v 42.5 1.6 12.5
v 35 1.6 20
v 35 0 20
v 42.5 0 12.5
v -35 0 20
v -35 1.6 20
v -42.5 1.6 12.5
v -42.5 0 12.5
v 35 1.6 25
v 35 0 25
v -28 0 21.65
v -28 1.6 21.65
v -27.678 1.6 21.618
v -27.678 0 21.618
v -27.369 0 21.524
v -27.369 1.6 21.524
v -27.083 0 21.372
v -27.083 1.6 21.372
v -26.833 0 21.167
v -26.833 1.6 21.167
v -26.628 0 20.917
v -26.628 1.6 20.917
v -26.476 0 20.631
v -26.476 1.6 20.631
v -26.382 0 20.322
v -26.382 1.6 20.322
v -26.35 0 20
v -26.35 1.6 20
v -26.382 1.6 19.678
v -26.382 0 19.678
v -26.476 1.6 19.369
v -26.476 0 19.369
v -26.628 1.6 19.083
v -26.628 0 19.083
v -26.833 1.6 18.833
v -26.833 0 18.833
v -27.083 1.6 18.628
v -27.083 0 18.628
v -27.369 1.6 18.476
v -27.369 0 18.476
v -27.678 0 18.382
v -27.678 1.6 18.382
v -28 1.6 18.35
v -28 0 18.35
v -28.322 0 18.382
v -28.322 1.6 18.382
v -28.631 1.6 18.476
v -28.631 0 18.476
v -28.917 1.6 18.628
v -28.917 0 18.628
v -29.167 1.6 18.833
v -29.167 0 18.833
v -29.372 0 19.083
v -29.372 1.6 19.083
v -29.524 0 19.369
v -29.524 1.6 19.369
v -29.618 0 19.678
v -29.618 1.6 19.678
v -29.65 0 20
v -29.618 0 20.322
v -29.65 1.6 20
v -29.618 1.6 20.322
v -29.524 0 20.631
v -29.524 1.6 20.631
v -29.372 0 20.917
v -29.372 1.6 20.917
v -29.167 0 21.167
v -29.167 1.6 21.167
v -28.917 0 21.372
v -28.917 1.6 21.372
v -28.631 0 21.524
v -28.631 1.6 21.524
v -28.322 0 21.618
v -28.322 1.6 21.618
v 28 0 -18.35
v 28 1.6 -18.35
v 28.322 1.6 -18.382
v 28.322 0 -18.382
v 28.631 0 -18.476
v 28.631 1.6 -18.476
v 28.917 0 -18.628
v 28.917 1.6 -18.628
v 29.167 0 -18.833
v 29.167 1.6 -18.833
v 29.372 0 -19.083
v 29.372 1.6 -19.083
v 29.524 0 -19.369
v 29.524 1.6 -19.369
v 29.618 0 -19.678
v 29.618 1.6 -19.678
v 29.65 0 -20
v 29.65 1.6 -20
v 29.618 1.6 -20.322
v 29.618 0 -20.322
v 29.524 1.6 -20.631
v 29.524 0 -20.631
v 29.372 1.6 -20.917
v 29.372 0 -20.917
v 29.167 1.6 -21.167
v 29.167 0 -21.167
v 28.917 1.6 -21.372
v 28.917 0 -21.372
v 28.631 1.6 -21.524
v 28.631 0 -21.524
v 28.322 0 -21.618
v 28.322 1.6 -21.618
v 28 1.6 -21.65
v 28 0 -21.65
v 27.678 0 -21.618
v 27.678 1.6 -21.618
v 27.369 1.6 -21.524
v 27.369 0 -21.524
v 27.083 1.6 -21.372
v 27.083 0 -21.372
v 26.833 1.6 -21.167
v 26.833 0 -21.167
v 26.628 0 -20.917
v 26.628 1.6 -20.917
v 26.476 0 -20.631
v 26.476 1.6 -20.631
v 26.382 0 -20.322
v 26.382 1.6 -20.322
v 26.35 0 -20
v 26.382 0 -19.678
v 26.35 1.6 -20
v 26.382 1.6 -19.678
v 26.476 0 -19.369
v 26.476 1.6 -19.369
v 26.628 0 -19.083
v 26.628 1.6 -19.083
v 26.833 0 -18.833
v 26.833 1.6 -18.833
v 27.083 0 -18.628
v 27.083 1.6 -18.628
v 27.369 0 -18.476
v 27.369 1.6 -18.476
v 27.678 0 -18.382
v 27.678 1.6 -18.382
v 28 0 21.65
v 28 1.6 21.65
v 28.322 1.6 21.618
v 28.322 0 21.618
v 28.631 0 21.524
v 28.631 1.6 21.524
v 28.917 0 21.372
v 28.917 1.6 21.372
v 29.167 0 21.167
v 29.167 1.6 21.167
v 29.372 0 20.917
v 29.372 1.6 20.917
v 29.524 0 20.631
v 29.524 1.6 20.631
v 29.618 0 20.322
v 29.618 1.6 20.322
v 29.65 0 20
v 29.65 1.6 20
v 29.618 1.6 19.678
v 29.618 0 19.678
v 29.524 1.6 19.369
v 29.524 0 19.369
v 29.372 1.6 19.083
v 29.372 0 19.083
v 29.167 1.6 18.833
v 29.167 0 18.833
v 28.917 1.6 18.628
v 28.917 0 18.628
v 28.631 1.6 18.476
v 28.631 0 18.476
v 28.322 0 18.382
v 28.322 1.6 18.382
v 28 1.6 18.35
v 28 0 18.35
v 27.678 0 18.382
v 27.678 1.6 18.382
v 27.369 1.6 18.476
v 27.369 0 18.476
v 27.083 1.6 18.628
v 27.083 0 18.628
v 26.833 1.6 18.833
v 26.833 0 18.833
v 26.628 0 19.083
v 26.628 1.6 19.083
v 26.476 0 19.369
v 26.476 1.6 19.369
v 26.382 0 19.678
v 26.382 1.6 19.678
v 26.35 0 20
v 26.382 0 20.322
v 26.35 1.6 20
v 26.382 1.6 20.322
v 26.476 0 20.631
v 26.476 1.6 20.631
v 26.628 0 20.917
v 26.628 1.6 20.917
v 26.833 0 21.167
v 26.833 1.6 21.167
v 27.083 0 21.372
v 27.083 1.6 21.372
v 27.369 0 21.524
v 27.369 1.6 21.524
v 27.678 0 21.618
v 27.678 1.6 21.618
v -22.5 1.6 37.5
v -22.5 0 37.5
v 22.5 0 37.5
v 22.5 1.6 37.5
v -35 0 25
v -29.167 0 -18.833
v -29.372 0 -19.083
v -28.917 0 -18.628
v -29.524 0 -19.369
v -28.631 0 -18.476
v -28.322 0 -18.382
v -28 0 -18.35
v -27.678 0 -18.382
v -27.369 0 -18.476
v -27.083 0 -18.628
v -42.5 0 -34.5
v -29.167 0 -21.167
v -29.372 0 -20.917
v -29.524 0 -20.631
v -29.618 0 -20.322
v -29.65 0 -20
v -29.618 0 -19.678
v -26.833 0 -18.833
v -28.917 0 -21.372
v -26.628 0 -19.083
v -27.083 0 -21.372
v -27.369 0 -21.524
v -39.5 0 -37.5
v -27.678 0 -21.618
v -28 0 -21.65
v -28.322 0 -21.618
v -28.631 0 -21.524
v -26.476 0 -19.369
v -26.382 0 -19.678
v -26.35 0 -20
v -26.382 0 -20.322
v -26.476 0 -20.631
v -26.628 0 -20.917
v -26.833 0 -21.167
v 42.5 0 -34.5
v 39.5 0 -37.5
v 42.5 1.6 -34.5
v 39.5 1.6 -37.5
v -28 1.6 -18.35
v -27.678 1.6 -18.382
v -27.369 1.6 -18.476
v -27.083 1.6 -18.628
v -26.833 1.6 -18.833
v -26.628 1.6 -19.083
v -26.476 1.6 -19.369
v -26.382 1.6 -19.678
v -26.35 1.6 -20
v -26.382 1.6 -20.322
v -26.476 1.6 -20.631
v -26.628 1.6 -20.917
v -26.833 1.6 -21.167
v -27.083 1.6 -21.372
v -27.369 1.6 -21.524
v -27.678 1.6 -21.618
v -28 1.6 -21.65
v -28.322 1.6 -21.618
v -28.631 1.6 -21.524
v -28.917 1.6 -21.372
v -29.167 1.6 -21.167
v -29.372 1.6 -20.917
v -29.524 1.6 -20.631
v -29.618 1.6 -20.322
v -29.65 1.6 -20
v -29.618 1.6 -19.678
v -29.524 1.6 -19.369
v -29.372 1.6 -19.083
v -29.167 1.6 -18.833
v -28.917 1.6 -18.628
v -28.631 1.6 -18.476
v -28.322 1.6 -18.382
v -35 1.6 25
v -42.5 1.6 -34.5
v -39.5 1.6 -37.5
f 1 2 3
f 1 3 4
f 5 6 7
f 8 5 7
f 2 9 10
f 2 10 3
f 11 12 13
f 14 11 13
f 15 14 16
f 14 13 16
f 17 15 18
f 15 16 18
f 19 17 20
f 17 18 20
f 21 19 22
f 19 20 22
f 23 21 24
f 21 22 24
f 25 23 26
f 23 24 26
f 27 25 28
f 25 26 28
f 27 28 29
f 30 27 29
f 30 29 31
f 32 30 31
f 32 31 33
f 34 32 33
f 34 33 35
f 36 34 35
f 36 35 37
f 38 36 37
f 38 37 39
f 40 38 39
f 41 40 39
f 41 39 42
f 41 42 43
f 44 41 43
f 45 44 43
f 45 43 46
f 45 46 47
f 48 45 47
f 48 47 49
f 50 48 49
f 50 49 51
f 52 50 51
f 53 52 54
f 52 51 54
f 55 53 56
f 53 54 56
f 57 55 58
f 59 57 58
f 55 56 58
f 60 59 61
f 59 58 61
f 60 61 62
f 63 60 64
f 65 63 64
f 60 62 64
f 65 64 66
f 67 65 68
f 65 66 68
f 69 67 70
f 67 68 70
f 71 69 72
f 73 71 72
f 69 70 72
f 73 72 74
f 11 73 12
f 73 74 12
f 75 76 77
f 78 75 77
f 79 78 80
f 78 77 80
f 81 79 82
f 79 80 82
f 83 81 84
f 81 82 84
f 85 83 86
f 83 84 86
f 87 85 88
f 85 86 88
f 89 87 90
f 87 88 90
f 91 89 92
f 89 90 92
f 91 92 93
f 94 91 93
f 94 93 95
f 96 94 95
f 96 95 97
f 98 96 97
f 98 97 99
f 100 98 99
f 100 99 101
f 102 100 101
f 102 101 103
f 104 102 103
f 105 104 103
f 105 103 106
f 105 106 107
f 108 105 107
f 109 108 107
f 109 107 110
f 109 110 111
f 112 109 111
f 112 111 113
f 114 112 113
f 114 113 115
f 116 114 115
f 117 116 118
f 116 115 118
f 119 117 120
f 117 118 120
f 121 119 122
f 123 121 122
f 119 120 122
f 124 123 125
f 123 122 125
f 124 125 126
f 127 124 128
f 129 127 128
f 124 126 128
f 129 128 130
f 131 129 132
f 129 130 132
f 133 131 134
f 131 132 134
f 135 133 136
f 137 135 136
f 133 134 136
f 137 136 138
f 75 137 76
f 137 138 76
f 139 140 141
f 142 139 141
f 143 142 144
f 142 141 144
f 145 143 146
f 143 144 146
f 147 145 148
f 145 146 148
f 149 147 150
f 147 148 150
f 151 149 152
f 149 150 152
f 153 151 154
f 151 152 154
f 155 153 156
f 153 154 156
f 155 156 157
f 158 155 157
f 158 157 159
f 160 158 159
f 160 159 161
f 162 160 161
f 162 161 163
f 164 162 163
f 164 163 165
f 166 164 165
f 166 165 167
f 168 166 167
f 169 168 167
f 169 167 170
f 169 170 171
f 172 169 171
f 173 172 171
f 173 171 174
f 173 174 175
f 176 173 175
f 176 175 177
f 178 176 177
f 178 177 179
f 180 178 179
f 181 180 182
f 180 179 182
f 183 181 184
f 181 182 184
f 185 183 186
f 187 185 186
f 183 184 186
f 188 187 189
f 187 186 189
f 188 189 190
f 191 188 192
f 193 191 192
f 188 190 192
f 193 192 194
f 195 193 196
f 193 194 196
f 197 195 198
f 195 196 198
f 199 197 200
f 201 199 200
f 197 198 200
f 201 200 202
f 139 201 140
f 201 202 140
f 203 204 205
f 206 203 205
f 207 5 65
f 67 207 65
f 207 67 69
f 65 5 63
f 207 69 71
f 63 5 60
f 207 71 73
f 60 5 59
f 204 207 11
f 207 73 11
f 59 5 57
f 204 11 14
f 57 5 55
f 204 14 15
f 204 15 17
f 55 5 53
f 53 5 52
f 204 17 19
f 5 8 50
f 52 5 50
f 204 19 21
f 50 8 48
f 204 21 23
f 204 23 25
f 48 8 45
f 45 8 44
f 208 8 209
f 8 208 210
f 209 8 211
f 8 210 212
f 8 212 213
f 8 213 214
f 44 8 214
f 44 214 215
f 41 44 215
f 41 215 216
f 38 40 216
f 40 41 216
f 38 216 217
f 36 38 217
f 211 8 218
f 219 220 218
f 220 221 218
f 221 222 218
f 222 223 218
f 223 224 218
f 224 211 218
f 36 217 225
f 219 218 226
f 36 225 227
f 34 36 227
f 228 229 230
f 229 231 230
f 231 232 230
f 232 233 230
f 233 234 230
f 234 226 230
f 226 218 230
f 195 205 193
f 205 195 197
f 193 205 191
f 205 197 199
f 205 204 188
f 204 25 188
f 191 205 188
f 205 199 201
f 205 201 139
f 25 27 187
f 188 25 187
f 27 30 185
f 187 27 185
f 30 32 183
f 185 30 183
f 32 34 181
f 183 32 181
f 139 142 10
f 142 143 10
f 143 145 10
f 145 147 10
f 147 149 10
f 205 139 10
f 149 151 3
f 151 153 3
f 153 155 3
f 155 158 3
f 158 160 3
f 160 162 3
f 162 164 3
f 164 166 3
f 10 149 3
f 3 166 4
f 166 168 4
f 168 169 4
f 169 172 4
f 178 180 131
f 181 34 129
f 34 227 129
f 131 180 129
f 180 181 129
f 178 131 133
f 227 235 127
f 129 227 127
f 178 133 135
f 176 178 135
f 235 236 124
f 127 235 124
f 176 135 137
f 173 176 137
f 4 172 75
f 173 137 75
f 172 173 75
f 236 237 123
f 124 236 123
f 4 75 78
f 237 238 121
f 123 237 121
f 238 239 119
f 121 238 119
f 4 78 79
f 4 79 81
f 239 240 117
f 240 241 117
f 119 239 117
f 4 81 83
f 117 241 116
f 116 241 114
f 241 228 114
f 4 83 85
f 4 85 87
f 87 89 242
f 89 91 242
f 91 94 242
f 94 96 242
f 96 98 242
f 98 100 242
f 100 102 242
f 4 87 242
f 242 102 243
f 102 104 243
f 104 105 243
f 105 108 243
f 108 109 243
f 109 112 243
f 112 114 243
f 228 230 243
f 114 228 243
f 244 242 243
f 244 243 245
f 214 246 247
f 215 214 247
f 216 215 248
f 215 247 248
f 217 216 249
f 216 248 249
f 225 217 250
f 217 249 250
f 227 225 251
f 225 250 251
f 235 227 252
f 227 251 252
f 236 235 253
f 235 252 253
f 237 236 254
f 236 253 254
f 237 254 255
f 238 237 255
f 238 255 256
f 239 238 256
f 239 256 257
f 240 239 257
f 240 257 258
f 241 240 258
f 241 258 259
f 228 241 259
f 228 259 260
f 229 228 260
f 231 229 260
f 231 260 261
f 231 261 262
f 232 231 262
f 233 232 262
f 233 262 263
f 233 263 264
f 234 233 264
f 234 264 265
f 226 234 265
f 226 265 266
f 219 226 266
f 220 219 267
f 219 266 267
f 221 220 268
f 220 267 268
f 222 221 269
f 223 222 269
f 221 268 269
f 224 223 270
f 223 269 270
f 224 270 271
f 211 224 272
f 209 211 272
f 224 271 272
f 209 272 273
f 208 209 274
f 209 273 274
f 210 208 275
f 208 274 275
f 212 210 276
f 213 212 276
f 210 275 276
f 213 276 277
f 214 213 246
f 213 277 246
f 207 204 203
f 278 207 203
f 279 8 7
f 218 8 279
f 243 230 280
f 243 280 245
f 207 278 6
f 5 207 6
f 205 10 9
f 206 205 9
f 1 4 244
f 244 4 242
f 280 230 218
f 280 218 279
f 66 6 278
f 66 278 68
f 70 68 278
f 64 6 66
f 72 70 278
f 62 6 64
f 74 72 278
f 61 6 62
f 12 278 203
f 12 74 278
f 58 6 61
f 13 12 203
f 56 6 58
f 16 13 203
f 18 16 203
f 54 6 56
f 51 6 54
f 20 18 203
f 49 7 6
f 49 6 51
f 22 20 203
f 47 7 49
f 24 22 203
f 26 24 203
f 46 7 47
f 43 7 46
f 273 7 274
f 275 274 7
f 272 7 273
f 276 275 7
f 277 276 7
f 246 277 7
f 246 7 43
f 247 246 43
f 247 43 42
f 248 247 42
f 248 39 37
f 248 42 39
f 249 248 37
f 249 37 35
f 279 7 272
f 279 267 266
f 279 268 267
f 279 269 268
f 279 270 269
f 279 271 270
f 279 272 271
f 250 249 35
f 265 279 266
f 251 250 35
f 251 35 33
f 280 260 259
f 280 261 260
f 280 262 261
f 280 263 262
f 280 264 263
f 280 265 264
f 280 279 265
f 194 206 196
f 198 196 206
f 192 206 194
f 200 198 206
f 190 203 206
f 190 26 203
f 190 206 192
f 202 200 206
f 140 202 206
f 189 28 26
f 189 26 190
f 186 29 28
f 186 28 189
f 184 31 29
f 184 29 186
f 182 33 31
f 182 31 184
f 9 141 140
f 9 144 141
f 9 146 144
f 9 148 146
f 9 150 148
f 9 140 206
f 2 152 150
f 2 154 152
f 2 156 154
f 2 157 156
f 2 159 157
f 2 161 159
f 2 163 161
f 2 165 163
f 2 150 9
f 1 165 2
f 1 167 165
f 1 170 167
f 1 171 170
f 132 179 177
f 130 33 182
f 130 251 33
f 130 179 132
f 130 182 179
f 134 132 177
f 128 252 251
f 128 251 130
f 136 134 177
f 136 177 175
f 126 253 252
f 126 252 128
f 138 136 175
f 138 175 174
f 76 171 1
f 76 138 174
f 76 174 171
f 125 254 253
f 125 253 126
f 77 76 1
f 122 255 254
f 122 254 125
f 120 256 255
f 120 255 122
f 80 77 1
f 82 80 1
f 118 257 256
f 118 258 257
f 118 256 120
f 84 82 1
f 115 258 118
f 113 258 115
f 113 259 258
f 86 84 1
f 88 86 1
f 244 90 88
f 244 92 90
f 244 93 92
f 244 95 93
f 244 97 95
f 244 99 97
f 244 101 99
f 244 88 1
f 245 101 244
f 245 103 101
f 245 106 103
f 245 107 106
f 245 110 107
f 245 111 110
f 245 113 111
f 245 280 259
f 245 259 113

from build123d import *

# Parameters (mm, degrees)
SKETCH_1_W          = 85
SKETCH_1_H          = 75
EXTRUDE_1_DEPTH     = 1.6
CUT_EXTRUDE_1_REACH = 58.701
SKETCH_2_R          = 1.65
CHAMFER_2_SIZE      = 3
CHAMFER_3_SIZE      = 20
CUT_EXTRUDE_4_REACH = 58.701


with BuildPart() as part:
    # 草图1 → 凸台-拉伸1 (new body)
    with BuildSketch(Plane(origin=(0, 0, 0), x_dir=(1, 0, 0), z_dir=(0, 1, 0))):
        Rectangle(SKETCH_1_W, SKETCH_1_H)
    extrude(amount=EXTRUDE_1_DEPTH)

    # 草图2 → 切除-拉伸1 (cut, up to next)
    with BuildSketch(Plane(origin=(0, 1.6, 0), x_dir=(1, 0, 0), z_dir=(0, 1, 0)), mode=Mode.PRIVATE) as cut_extrude_1_sk1:
        with Locations(Location((-28, 20, 0), (0, 0, 270))):
            Circle(SKETCH_2_R)
    cut_extrude_1_tool1 = extrude(cut_extrude_1_sk1.sketch, amount=-CUT_EXTRUDE_1_REACH, mode=Mode.PRIVATE) & part.part
    # 草图2 → 切除-拉伸1 (cut, up to next)
    with BuildSketch(Plane(origin=(0, 1.6, 0), x_dir=(1, 0, 0), z_dir=(0, 1, 0)), mode=Mode.PRIVATE) as cut_extrude_1_sk2:
        with Locations(Location((-28, -20, 0), (0, 0, 270))):
            Circle(SKETCH_2_R)
    cut_extrude_1_tool2 = extrude(cut_extrude_1_sk2.sketch, amount=-CUT_EXTRUDE_1_REACH, mode=Mode.PRIVATE) & part.part
    # 草图2 → 切除-拉伸1 (cut, up to next)
    with BuildSketch(Plane(origin=(0, 1.6, 0), x_dir=(1, 0, 0), z_dir=(0, 1, 0)), mode=Mode.PRIVATE) as cut_extrude_1_sk3:
        with Locations(Location((28, 20, 0), (0, 0, 270))):
            Circle(SKETCH_2_R)
    cut_extrude_1_tool3 = extrude(cut_extrude_1_sk3.sketch, amount=-CUT_EXTRUDE_1_REACH, mode=Mode.PRIVATE) & part.part
    # 草图2 → 切除-拉伸1 (cut, up to next)
    with BuildSketch(Plane(origin=(0, 1.6, 0), x_dir=(1, 0, 0), z_dir=(0, 1, 0)), mode=Mode.PRIVATE) as cut_extrude_1_sk4:
        with Locations(Location((28, -20, 0), (0, 0, 270))):
            Circle(SKETCH_2_R)
    cut_extrude_1_tool4 = extrude(cut_extrude_1_sk4.sketch, amount=-CUT_EXTRUDE_1_REACH, mode=Mode.PRIVATE) & part.part
    add(cut_extrude_1_tool1.solids().sort_by_distance((-28, 1.6, -20))[0], mode=Mode.SUBTRACT)
    add(cut_extrude_1_tool2.solids().sort_by_distance((-28, 1.6, 20))[0], mode=Mode.SUBTRACT)
    add(cut_extrude_1_tool3.solids().sort_by_distance((28, 1.6, -20))[0], mode=Mode.SUBTRACT)
    add(cut_extrude_1_tool4.solids().sort_by_distance((28, 1.6, 20))[0], mode=Mode.SUBTRACT)

    # 倒角2
    chamfer_2_edges = [part.edges().sort_by_distance(p)[0] for p in [
        (-42.5, 0.8, -37.5),
        (42.5, 0.8, -37.5),
    ]]
    chamfer(chamfer_2_edges, length=CHAMFER_2_SIZE)

    # 倒角3
    chamfer_3_edges = [part.edges().sort_by_distance(p)[0] for p in [
        (42.5, 0.8, 37.5),
        (-42.5, 0.8, 37.5),
    ]]
    chamfer(chamfer_3_edges, length=CHAMFER_3_SIZE)

    # 草图7 → 切除-拉伸4 (cut, up to next)
    with BuildSketch(Plane(origin=(0, 1.6, 0), x_dir=(1, 0, 0), z_dir=(0, 1, 0)), mode=Mode.PRIVATE) as cut_extrude_4_sk1:
        Polygon((-35, -25), (-35, -20), (-42.5, -12.5), (-42.5, -17.5), align=None)
    cut_extrude_4_tool1 = extrude(cut_extrude_4_sk1.sketch, amount=-CUT_EXTRUDE_4_REACH, mode=Mode.PRIVATE) & part.part
    cut_extrude_4 = cut_extrude_4_tool1.solids().sort_by_distance((-38.75, 1.6, 18.75))[0]
    add(cut_extrude_4, mode=Mode.SUBTRACT)

    # 镜向1: 切除-拉伸4 across plane
    add(cut_extrude_4.mirror(Plane(origin=(0, 0, 0), x_dir=(0, 0, 1), z_dir=(1, 0, 0))), mode=Mode.SUBTRACT)


solid = part.part
